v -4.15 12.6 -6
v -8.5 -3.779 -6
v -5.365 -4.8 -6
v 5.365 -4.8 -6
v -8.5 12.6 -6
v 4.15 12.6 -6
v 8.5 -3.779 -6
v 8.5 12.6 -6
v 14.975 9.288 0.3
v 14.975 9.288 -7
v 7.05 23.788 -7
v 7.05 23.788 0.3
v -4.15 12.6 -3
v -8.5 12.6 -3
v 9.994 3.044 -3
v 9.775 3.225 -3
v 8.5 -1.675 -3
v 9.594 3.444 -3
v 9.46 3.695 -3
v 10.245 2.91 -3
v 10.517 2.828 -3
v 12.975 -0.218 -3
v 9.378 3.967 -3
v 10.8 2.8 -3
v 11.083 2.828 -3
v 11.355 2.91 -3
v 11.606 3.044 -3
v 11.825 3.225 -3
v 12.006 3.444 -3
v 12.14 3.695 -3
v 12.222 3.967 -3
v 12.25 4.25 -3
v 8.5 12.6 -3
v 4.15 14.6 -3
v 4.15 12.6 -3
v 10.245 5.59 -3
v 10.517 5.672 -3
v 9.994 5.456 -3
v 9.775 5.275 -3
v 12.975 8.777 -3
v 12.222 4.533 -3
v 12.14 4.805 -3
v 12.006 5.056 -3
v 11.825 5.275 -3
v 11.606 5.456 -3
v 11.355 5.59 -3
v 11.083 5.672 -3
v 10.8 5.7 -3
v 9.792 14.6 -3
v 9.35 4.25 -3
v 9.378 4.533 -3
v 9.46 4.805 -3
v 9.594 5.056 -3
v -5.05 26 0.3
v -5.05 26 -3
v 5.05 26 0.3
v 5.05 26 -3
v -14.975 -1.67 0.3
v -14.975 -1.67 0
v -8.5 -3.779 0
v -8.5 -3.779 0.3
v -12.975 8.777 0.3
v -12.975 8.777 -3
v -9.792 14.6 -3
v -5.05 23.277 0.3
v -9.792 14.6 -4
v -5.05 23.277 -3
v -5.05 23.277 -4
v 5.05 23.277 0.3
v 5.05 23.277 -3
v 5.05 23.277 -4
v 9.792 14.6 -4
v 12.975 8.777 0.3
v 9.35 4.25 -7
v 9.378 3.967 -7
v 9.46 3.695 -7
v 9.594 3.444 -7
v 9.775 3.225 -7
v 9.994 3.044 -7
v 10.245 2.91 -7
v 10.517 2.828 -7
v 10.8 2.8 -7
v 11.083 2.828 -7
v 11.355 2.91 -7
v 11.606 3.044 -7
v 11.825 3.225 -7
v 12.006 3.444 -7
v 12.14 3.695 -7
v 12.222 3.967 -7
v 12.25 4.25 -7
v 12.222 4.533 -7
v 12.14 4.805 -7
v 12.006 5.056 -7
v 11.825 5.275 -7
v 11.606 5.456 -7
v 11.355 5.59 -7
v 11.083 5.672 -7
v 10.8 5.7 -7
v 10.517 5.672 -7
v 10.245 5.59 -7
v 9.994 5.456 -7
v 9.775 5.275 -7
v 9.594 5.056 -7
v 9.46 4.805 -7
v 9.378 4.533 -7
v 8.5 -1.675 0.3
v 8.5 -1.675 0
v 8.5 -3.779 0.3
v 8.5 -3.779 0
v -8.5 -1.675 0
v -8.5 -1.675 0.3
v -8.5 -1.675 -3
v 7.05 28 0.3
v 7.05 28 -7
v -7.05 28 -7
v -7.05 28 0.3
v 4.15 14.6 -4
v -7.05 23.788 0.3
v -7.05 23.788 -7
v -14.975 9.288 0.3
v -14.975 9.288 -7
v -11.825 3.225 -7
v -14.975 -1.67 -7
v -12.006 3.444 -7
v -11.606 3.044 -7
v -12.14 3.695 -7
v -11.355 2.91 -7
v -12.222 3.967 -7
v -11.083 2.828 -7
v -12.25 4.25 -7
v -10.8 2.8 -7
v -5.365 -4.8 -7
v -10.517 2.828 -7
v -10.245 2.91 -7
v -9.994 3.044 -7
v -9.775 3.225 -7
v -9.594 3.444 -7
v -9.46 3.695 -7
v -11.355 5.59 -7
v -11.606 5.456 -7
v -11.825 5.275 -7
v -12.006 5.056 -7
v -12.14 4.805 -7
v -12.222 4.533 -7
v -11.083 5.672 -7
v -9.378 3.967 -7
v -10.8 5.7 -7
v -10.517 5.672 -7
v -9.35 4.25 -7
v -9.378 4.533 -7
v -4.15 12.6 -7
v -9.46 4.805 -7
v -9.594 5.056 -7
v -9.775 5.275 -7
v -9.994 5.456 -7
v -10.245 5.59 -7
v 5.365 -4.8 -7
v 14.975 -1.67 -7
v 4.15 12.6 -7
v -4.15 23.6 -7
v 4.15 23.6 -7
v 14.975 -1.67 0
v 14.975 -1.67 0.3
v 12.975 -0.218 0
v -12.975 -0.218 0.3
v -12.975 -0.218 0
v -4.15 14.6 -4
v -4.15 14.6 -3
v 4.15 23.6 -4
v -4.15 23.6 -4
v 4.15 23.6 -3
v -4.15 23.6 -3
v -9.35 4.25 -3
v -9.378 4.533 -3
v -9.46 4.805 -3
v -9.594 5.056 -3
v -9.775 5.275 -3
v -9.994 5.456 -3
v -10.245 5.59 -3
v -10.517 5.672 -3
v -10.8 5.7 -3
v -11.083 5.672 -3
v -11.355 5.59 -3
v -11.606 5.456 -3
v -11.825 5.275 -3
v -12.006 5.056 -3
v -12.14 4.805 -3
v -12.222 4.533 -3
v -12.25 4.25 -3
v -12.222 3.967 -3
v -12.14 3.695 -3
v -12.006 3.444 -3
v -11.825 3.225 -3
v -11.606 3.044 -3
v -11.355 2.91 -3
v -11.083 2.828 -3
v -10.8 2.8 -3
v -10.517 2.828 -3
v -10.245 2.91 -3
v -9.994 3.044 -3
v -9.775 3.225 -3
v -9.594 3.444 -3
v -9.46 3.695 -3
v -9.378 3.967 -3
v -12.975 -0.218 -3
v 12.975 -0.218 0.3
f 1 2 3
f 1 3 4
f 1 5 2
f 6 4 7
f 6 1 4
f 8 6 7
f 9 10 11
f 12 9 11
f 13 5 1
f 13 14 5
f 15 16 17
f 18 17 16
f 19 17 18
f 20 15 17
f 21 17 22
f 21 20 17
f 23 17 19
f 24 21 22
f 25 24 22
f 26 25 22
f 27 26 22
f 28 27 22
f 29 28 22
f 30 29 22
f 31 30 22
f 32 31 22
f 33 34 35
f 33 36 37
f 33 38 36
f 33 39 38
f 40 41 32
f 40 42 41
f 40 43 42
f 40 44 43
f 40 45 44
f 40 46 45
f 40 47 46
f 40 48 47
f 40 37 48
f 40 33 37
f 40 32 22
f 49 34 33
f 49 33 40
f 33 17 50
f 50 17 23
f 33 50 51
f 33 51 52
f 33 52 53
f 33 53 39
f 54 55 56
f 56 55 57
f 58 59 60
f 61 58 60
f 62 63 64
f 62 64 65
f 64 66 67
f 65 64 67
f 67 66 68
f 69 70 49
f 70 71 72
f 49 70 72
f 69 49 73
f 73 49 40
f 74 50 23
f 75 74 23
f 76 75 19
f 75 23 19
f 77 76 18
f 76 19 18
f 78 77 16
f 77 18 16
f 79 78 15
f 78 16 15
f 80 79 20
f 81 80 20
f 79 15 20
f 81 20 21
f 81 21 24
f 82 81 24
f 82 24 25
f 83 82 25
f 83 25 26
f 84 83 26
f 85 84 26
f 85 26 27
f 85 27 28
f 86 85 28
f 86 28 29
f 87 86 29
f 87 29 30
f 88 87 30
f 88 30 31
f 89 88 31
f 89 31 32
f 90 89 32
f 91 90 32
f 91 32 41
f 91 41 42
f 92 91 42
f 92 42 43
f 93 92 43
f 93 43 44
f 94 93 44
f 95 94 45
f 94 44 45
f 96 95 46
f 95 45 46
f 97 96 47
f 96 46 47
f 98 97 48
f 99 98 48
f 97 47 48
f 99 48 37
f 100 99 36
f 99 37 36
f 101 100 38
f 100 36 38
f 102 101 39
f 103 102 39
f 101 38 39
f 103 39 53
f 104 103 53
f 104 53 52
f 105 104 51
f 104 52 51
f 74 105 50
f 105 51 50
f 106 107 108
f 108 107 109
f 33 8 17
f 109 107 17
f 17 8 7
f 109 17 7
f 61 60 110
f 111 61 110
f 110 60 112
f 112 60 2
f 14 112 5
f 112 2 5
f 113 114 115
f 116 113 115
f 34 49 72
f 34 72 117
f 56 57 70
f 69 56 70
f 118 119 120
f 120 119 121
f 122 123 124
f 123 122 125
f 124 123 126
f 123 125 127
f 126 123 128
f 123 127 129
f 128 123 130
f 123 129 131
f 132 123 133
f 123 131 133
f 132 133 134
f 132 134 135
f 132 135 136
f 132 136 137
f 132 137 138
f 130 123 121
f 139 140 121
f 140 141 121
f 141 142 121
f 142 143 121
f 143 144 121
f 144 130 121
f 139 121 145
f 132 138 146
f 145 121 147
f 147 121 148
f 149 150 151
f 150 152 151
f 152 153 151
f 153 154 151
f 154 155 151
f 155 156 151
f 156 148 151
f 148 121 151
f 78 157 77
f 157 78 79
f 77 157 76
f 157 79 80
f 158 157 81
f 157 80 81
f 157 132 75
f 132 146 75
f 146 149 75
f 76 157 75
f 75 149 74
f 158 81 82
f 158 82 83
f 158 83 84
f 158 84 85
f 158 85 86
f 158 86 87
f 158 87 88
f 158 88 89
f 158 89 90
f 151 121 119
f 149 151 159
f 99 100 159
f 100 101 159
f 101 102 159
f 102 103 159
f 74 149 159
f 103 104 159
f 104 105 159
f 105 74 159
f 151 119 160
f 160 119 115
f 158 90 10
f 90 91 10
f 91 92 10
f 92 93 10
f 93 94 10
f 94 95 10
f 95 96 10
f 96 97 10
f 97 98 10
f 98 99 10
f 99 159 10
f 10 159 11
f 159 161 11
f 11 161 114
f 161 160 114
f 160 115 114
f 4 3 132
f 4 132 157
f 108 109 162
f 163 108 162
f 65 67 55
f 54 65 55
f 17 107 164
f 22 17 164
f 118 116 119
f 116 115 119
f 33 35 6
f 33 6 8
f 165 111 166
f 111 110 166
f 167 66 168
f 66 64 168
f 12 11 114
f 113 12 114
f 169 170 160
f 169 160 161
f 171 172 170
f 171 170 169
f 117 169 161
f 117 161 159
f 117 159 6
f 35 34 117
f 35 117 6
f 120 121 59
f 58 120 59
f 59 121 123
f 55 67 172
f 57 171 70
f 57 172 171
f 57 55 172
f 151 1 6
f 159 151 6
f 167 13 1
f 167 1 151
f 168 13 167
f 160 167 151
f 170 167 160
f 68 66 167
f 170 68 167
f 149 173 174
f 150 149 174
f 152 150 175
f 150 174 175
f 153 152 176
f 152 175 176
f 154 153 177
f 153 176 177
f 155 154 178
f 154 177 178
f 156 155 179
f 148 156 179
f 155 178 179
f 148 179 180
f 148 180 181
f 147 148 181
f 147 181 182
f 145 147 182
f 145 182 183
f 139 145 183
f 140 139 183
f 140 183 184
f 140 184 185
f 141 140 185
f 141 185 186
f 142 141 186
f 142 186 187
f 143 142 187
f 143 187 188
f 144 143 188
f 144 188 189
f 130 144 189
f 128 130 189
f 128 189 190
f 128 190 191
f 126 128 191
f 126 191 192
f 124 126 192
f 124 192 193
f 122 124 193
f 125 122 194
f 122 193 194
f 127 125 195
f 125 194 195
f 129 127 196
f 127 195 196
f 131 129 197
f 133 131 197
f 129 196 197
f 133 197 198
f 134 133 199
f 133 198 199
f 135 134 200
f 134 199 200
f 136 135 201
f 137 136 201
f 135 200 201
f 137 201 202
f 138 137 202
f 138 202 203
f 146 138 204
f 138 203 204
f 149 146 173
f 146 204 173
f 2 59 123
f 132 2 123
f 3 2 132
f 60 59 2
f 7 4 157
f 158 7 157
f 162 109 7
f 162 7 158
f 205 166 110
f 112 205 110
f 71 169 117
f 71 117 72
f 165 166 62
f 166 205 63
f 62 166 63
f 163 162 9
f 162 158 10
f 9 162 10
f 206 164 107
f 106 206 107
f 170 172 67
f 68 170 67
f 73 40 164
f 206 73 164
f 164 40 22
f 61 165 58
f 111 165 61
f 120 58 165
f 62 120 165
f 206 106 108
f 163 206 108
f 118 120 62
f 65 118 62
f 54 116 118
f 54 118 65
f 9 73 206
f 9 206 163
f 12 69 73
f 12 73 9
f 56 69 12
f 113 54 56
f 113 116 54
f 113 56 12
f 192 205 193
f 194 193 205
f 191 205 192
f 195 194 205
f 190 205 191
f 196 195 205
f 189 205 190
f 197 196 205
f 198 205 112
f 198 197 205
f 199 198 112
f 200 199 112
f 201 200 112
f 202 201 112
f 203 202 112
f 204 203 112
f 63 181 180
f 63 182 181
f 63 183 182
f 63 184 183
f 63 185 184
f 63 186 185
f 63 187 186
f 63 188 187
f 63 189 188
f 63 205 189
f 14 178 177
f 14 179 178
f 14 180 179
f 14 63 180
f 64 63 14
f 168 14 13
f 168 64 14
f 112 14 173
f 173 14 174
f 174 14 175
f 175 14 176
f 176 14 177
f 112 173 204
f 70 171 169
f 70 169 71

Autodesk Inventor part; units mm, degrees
ref_plane "YZ Plane" through (0, 0, 0) normal (1, 0, 0) x (0, 1, 0)
ref_plane "XZ Plane" through (0, 0, 0) normal (0, 1, 0) x (-1, 0, 0)
ref_plane "XY Plane" through (0, 0, 0) normal (0, 0, 1) x (1, 0, 0)
sketch "Sketch1" plane through (0, 0, 0) normal (0, 0, 1) x (1, 0, 0)
  line L0 (-5, -2.5) -> (5, -2.5) construction
  line L1 (5, -2.5) -> (12.675, 0) construction
  line L2 (-5, -2.5) -> (-12.675, 0)
  line L3 (12.675, 0) -> (-12.675, 0) construction
  line L4 (12.675, 0) -> (12.675, 8.7) construction
  line L5 (-12.675, 0) -> (-12.675, 8.7)
  line L6 (-12.675, 8.7) -> (-4.75, 23.2)
  line L7 (-4.75, 23.2) -> (-4.75, 25.7)
  line L8 (-4.75, 25.7) -> (4.75, 25.7) construction
  line L9 (4.75, 25.7) -> (4.75, 23.2) construction
  line L10 (4.75, 23.2) -> (12.675, 8.7) construction
  line L11 (0, -8.56) -> (0, 31.76) projected
  line L12 (0, 25.7) -> (0, -2.5)
  circle A0 centre (-10.8, 4.25) radius 1.25
  line L13 (-10.8, 4.25) -> (0, 4.25) construction
  line L14 (-4.75, 25.7) -> (0, 25.7)
  line L15 (-5, -2.5) -> (0, -2.5)
  line L16 (-5.05, 23.2766) -> (-12.975, 8.7766)
  line L17 (-12.975, 8.7766) -> (-12.975, -0.2178)
  line L18 (-12.975, -0.2178) -> (-5.0476, -2.8)
  line L19 (-5.0476, -2.8) -> (0.3, -2.8) construction
  line L20 (0.3, -2.8) -> (0.3, 26) construction
  line L21 (0.3, 26) -> (-5.05, 26) construction
  line L22 (-5.05, 26) -> (-5.05, 23.2766)
  line L23 (0, -2.5) -> (0, -2.8)
  line L24 (0, 25.7) -> (0, 26)
  line L25 (0, -2.8) -> (-5.0476, -2.8)
  line L26 (0, 26) -> (-5.05, 26)
  point P0 (0, 0)
  point P1 (0, 0)
  dimension "d0" = 10
  dimension "d1" = 25.35
  dimension "d2" = 2.5
  dimension "d3" = 8.7
  dimension "d4" = 28.2
  dimension "d6" = 2.5
  dimension "d7" = 9.5
  dimension "d42" = 2.5
  dimension "d43" = 10.8
  dimension "d44" = 6.75
  dimension "d53" = 0.3
sketch "Sketch8" plane through (0, 0, 0) normal (0, 0, 1) x (1, 0, 0)
  line L0 (-20, 30) -> (20, 30)
  line L1 (20, 30) -> (20, -10)
  line L2 (20, -10) -> (-20, -10)
  line L3 (-20, -10) -> (-20, 30)
  point P0 (0, 0)
  point P1 (0, -10)
  dimension "d45" = 40
  dimension "d46" = 10
extrude "MainBlock" add sketch "Sketch8" against normal blind 7
extrude "CartridgeCutout" cut sketch "Sketch1" against normal blind 3
sketch "Sketch10" plane through (-10.8, 4.25, 0) normal (0, 0, 1) x (1, 0, 0)
  circle A0 centre (0, 0) radius 1.25 projected
  circle A1 centre (0, 0) radius 1.45
  point P0 (10.8, -4.25)
  dimension "d56" = 0.2
extrude "PinHole" cut sketch "Sketch10" against normal through all contours A0 | A1
mirror "Mirror3" about plane through (0, 26, 0) normal (-1, 0, 0) of "CartridgeCutout", "PinHole"
sketch "Sketch12" plane through (0, 0, -3) normal (0, 0, 1) x (1, 0, 0)
  circle A0 centre (10.8, 4.25) radius 1.45 projected
  circle A1 centre (-10.8, 4.25) radius 1.45 projected
  line L0 (5.05, 26) -> (-5.05, 26) projected
  line L1 (-5.05, 23.2766) -> (-5.05, 26) projected
  line L2 (-12.975, 8.7766) -> (-5.05, 23.2766) projected
  line L3 (-12.975, -0.2178) -> (-12.975, 8.7766) projected
  line L4 (-5.0476, -2.8) -> (-12.975, -0.2178) projected
  line L5 (5.0476, -2.8) -> (-5.0476, -2.8) projected
  line L6 (5.0476, -2.8) -> (12.975, -0.2178) projected
  line L7 (12.975, -0.2178) -> (12.975, 8.7766) projected
  line L8 (12.975, 8.7766) -> (5.05, 23.2766) projected
  line L9 (5.05, 23.2766) -> (5.05, 26) projected
  line L10 (-4.15, 23.6) -> (4.15, 23.6)
  line L11 (4.15, 23.6) -> (4.15, -1.4)
  line L12 (4.15, -1.4) -> (-4.15, -1.4)
  line L13 (-4.15, -1.4) -> (-4.15, 23.6)
  point P0 (0, 0)
  point P1 (0, -1.4)
  dimension "d59" = 8.3
  dimension "d60" = 25
  dimension "d61" = 1.4
extrude "CentreHole" cut sketch "Sketch12" against normal through all contours L10 L11 L12 L13
sketch "Sketch13" plane through (0, 0, 0) normal (0, 0, 1) x (1, 0, 0)
  line L0 (-5.05, 26) -> (5.05, 26) projected
  line L1 (5.05, 26) -> (5.05, 23.2766) projected
  line L2 (5.05, 23.2766) -> (12.975, 8.7766) projected
  line L3 (12.975, 8.7766) -> (12.975, -0.2178) projected
  line L4 (12.975, -0.2178) -> (5.0476, -2.8) projected
  line L5 (5.0476, -2.8) -> (-5.0476, -2.8) projected
  line L6 (-5.0476, -2.8) -> (-12.975, -0.2178) projected
  line L7 (-12.975, -0.2178) -> (-12.975, 8.7766) projected
  line L8 (-12.975, 8.7766) -> (-5.05, 23.2766) projected
  line L9 (-5.05, 23.2766) -> (-5.05, 26) projected
  line L10 (-20, 30) -> (20, 30) projected
  line L11 (-20, -10) -> (-20, 30) projected
  line L12 (20, -10) -> (-20, -10) projected
  line L13 (20, 30) -> (20, -10) projected
  line L14 (-14.975, 9.2875) -> (-14.975, -1.6698)
  line L15 (-14.975, -1.6698) -> (-5.3652, -4.8)
  line L16 (-5.3652, -4.8) -> (5.3652, -4.8)
  line L17 (5.3652, -4.8) -> (14.975, -1.6698)
  line L18 (14.975, -1.6698) -> (14.975, 9.2875)
  line L19 (14.975, 9.2875) -> (7.05, 23.7875)
  line L20 (7.05, 23.7875) -> (7.05, 28)
  line L21 (7.05, 28) -> (-7.05, 28)
  line L22 (-7.05, 28) -> (-7.05, 23.7875)
  line L23 (-7.05, 23.7875) -> (-14.975, 9.2875)
  point P0 (0, 0)
  dimension "d65" = 2
extrude "OutlineCut" cut sketch "Sketch13" against normal through all contours L10 L13 L12 L11
sketch "Sketch14" plane through (0, 0, -3) normal (0, 0, 1) x (1, 0, 0)
  line L0 (-4.15, -1.4) -> (-4.15, 23.6) projected
  line L1 (-4.15, 23.6) -> (4.15, 23.6) projected
  line L2 (4.15, 23.6) -> (4.15, -1.4) projected
  line L3 (4.15, -1.4) -> (-4.15, -1.4) construction
  circle A0 centre (10.8, 4.25) radius 1.45 construction
  circle A1 centre (-10.8, 4.25) radius 1.45 construction
  line L4 (5.05, 26) -> (-5.05, 26) projected
  line L5 (-5.05, 23.2766) -> (-5.05, 26) projected
  line L6 (-12.975, 8.7766) -> (-5.05, 23.2766) projected
  line L7 (-12.975, -0.2178) -> (-12.975, 8.7766) construction
  line L8 (-5.0476, -2.8) -> (-12.975, -0.2178) construction
  line L9 (5.0476, -2.8) -> (-5.0476, -2.8) construction
  line L10 (5.0476, -2.8) -> (12.975, -0.2178) construction
  line L11 (12.975, -0.2178) -> (12.975, 8.7766) construction
  line L12 (12.975, 8.7766) -> (5.05, 23.2766) projected
  line L13 (5.05, 23.2766) -> (5.05, 26) projected
  line L14 (-9.7922, 14.6) -> (-4.15, 14.6)
  line L15 (-12.975, 8.7766) -> (-5.05, 23.2766) projected
  line L16 (-4.15, 23.6) -> (-5.05, 23.2766)
  line L17 (0, -18) -> (0, 38) projected
  line L18 (-4.15, 23.6) -> (-4.15, 14.6)
  line L19 (-4.15, -1.4) -> (-4.15, 23.6) projected
  line L20 (-5.05, 23.2766) -> (-9.7922, 14.6)
  line L21 (-12.975, 8.7766) -> (-5.05, 23.2766) projected
  line L22 (9.7922, 14.6) -> (4.15, 14.6)
  line L23 (4.15, 23.6) -> (5.05, 23.2766)
  line L24 (4.15, 23.6) -> (4.15, 14.6)
  line L25 (5.05, 23.2766) -> (9.7922, 14.6)
  point P0 (0, 0)
  dimension "d70" = 9
extrude "AlignmentGooveCut" cut sketch "Sketch14" against normal blind 1 contours L14 L6 L16 L0 | L23 L12 L22 L2
sketch "Sketch16" plane through (0, 0, 0) normal (0, 0, 1) x (1, 0, 0)
  line L0 (-8.5, 12.6) -> (8.5, 12.6)
  line L1 (8.5, 12.6) -> (8.5, -7.4)
  line L2 (8.5, -7.4) -> (-8.5, -7.4)
  line L3 (-8.5, -7.4) -> (-8.5, 12.6)
  line L4 (4.15, -1.4) -> (-4.15, -1.4) projected
  point P0 (0, 0)
  point P1 (0, -7.4)
  dimension "d73" = 17
  dimension "d74" = 20
  dimension "d75" = 14
extrude "CircuitBoardCut" cut sketch "Sketch16" against normal blind 6
sketch "Sketch18" plane through (0, 0, -6) normal (0, 0, 1) x (1, 0, 0)
  line L0 (-4.15, 12.6) -> (-4.15, -1.4) projected
  line L1 (-4.15, -1.4) -> (4.15, -1.4) projected
  line L2 (4.15, -1.4) -> (4.15, 12.6) projected
  line L3 (-4.15, 12.6) -> (4.15, 12.6)
  line L4 (-4.15, 23.6) -> (-4.15, -1.4) projected
  point P0 (0, 0)
extrude "CircuitBoardFillIn" add sketch "Sketch18" against normal up to surface (1 mm away)
sketch "Sketch19" plane through (0, 0, 0) normal (0, 0, 1) x (1, 0, 0)
  line L0 (8.5, -1.6754) -> (8.5, -3.7789) projected
  line L1 (8.5, -3.7789) -> (14.975, -1.6698) projected
  line L2 (14.975, -1.6698) -> (14.975, 9.2875) projected
  line L3 (14.975, 9.2875) -> (7.05, 23.7875) projected
  line L4 (7.05, 23.7875) -> (7.05, 28) projected
  line L5 (-7.05, 28) -> (-7.05, 23.7875) projected
  line L6 (-7.05, 23.7875) -> (-14.975, 9.2875) projected
  line L7 (-14.975, 9.2875) -> (-14.975, -1.6698) projected
  line L8 (-14.975, -1.6698) -> (-8.5, -3.7789) projected
  line L9 (-8.5, -3.7789) -> (-8.5, -1.6754) projected
  line L10 (-8.5, -1.6754) -> (-12.975, -0.2178) projected
  line L11 (-12.975, -0.2178) -> (-12.975, 8.7766) projected
  line L12 (-12.975, 8.7766) -> (-5.05, 23.2766) projected
  line L13 (-5.05, 23.2766) -> (-5.05, 26) projected
  line L14 (-5.05, 26) -> (5.05, 26) projected
  line L15 (5.05, 26) -> (5.05, 23.2766) projected
  line L16 (5.05, 23.2766) -> (12.975, 8.7766) projected
  line L17 (12.975, 8.7766) -> (12.975, -0.2178) projected
  line L18 (12.975, -0.2178) -> (8.5, -1.6754) projected
  line L19 (7.05, 28) -> (-7.05, 28) projected
  point P0 (0, 0)
extrude "TopHeightAdjustment" add sketch "Sketch19" along normal blind 0.3
properties part number "InkjetHolderV5"
